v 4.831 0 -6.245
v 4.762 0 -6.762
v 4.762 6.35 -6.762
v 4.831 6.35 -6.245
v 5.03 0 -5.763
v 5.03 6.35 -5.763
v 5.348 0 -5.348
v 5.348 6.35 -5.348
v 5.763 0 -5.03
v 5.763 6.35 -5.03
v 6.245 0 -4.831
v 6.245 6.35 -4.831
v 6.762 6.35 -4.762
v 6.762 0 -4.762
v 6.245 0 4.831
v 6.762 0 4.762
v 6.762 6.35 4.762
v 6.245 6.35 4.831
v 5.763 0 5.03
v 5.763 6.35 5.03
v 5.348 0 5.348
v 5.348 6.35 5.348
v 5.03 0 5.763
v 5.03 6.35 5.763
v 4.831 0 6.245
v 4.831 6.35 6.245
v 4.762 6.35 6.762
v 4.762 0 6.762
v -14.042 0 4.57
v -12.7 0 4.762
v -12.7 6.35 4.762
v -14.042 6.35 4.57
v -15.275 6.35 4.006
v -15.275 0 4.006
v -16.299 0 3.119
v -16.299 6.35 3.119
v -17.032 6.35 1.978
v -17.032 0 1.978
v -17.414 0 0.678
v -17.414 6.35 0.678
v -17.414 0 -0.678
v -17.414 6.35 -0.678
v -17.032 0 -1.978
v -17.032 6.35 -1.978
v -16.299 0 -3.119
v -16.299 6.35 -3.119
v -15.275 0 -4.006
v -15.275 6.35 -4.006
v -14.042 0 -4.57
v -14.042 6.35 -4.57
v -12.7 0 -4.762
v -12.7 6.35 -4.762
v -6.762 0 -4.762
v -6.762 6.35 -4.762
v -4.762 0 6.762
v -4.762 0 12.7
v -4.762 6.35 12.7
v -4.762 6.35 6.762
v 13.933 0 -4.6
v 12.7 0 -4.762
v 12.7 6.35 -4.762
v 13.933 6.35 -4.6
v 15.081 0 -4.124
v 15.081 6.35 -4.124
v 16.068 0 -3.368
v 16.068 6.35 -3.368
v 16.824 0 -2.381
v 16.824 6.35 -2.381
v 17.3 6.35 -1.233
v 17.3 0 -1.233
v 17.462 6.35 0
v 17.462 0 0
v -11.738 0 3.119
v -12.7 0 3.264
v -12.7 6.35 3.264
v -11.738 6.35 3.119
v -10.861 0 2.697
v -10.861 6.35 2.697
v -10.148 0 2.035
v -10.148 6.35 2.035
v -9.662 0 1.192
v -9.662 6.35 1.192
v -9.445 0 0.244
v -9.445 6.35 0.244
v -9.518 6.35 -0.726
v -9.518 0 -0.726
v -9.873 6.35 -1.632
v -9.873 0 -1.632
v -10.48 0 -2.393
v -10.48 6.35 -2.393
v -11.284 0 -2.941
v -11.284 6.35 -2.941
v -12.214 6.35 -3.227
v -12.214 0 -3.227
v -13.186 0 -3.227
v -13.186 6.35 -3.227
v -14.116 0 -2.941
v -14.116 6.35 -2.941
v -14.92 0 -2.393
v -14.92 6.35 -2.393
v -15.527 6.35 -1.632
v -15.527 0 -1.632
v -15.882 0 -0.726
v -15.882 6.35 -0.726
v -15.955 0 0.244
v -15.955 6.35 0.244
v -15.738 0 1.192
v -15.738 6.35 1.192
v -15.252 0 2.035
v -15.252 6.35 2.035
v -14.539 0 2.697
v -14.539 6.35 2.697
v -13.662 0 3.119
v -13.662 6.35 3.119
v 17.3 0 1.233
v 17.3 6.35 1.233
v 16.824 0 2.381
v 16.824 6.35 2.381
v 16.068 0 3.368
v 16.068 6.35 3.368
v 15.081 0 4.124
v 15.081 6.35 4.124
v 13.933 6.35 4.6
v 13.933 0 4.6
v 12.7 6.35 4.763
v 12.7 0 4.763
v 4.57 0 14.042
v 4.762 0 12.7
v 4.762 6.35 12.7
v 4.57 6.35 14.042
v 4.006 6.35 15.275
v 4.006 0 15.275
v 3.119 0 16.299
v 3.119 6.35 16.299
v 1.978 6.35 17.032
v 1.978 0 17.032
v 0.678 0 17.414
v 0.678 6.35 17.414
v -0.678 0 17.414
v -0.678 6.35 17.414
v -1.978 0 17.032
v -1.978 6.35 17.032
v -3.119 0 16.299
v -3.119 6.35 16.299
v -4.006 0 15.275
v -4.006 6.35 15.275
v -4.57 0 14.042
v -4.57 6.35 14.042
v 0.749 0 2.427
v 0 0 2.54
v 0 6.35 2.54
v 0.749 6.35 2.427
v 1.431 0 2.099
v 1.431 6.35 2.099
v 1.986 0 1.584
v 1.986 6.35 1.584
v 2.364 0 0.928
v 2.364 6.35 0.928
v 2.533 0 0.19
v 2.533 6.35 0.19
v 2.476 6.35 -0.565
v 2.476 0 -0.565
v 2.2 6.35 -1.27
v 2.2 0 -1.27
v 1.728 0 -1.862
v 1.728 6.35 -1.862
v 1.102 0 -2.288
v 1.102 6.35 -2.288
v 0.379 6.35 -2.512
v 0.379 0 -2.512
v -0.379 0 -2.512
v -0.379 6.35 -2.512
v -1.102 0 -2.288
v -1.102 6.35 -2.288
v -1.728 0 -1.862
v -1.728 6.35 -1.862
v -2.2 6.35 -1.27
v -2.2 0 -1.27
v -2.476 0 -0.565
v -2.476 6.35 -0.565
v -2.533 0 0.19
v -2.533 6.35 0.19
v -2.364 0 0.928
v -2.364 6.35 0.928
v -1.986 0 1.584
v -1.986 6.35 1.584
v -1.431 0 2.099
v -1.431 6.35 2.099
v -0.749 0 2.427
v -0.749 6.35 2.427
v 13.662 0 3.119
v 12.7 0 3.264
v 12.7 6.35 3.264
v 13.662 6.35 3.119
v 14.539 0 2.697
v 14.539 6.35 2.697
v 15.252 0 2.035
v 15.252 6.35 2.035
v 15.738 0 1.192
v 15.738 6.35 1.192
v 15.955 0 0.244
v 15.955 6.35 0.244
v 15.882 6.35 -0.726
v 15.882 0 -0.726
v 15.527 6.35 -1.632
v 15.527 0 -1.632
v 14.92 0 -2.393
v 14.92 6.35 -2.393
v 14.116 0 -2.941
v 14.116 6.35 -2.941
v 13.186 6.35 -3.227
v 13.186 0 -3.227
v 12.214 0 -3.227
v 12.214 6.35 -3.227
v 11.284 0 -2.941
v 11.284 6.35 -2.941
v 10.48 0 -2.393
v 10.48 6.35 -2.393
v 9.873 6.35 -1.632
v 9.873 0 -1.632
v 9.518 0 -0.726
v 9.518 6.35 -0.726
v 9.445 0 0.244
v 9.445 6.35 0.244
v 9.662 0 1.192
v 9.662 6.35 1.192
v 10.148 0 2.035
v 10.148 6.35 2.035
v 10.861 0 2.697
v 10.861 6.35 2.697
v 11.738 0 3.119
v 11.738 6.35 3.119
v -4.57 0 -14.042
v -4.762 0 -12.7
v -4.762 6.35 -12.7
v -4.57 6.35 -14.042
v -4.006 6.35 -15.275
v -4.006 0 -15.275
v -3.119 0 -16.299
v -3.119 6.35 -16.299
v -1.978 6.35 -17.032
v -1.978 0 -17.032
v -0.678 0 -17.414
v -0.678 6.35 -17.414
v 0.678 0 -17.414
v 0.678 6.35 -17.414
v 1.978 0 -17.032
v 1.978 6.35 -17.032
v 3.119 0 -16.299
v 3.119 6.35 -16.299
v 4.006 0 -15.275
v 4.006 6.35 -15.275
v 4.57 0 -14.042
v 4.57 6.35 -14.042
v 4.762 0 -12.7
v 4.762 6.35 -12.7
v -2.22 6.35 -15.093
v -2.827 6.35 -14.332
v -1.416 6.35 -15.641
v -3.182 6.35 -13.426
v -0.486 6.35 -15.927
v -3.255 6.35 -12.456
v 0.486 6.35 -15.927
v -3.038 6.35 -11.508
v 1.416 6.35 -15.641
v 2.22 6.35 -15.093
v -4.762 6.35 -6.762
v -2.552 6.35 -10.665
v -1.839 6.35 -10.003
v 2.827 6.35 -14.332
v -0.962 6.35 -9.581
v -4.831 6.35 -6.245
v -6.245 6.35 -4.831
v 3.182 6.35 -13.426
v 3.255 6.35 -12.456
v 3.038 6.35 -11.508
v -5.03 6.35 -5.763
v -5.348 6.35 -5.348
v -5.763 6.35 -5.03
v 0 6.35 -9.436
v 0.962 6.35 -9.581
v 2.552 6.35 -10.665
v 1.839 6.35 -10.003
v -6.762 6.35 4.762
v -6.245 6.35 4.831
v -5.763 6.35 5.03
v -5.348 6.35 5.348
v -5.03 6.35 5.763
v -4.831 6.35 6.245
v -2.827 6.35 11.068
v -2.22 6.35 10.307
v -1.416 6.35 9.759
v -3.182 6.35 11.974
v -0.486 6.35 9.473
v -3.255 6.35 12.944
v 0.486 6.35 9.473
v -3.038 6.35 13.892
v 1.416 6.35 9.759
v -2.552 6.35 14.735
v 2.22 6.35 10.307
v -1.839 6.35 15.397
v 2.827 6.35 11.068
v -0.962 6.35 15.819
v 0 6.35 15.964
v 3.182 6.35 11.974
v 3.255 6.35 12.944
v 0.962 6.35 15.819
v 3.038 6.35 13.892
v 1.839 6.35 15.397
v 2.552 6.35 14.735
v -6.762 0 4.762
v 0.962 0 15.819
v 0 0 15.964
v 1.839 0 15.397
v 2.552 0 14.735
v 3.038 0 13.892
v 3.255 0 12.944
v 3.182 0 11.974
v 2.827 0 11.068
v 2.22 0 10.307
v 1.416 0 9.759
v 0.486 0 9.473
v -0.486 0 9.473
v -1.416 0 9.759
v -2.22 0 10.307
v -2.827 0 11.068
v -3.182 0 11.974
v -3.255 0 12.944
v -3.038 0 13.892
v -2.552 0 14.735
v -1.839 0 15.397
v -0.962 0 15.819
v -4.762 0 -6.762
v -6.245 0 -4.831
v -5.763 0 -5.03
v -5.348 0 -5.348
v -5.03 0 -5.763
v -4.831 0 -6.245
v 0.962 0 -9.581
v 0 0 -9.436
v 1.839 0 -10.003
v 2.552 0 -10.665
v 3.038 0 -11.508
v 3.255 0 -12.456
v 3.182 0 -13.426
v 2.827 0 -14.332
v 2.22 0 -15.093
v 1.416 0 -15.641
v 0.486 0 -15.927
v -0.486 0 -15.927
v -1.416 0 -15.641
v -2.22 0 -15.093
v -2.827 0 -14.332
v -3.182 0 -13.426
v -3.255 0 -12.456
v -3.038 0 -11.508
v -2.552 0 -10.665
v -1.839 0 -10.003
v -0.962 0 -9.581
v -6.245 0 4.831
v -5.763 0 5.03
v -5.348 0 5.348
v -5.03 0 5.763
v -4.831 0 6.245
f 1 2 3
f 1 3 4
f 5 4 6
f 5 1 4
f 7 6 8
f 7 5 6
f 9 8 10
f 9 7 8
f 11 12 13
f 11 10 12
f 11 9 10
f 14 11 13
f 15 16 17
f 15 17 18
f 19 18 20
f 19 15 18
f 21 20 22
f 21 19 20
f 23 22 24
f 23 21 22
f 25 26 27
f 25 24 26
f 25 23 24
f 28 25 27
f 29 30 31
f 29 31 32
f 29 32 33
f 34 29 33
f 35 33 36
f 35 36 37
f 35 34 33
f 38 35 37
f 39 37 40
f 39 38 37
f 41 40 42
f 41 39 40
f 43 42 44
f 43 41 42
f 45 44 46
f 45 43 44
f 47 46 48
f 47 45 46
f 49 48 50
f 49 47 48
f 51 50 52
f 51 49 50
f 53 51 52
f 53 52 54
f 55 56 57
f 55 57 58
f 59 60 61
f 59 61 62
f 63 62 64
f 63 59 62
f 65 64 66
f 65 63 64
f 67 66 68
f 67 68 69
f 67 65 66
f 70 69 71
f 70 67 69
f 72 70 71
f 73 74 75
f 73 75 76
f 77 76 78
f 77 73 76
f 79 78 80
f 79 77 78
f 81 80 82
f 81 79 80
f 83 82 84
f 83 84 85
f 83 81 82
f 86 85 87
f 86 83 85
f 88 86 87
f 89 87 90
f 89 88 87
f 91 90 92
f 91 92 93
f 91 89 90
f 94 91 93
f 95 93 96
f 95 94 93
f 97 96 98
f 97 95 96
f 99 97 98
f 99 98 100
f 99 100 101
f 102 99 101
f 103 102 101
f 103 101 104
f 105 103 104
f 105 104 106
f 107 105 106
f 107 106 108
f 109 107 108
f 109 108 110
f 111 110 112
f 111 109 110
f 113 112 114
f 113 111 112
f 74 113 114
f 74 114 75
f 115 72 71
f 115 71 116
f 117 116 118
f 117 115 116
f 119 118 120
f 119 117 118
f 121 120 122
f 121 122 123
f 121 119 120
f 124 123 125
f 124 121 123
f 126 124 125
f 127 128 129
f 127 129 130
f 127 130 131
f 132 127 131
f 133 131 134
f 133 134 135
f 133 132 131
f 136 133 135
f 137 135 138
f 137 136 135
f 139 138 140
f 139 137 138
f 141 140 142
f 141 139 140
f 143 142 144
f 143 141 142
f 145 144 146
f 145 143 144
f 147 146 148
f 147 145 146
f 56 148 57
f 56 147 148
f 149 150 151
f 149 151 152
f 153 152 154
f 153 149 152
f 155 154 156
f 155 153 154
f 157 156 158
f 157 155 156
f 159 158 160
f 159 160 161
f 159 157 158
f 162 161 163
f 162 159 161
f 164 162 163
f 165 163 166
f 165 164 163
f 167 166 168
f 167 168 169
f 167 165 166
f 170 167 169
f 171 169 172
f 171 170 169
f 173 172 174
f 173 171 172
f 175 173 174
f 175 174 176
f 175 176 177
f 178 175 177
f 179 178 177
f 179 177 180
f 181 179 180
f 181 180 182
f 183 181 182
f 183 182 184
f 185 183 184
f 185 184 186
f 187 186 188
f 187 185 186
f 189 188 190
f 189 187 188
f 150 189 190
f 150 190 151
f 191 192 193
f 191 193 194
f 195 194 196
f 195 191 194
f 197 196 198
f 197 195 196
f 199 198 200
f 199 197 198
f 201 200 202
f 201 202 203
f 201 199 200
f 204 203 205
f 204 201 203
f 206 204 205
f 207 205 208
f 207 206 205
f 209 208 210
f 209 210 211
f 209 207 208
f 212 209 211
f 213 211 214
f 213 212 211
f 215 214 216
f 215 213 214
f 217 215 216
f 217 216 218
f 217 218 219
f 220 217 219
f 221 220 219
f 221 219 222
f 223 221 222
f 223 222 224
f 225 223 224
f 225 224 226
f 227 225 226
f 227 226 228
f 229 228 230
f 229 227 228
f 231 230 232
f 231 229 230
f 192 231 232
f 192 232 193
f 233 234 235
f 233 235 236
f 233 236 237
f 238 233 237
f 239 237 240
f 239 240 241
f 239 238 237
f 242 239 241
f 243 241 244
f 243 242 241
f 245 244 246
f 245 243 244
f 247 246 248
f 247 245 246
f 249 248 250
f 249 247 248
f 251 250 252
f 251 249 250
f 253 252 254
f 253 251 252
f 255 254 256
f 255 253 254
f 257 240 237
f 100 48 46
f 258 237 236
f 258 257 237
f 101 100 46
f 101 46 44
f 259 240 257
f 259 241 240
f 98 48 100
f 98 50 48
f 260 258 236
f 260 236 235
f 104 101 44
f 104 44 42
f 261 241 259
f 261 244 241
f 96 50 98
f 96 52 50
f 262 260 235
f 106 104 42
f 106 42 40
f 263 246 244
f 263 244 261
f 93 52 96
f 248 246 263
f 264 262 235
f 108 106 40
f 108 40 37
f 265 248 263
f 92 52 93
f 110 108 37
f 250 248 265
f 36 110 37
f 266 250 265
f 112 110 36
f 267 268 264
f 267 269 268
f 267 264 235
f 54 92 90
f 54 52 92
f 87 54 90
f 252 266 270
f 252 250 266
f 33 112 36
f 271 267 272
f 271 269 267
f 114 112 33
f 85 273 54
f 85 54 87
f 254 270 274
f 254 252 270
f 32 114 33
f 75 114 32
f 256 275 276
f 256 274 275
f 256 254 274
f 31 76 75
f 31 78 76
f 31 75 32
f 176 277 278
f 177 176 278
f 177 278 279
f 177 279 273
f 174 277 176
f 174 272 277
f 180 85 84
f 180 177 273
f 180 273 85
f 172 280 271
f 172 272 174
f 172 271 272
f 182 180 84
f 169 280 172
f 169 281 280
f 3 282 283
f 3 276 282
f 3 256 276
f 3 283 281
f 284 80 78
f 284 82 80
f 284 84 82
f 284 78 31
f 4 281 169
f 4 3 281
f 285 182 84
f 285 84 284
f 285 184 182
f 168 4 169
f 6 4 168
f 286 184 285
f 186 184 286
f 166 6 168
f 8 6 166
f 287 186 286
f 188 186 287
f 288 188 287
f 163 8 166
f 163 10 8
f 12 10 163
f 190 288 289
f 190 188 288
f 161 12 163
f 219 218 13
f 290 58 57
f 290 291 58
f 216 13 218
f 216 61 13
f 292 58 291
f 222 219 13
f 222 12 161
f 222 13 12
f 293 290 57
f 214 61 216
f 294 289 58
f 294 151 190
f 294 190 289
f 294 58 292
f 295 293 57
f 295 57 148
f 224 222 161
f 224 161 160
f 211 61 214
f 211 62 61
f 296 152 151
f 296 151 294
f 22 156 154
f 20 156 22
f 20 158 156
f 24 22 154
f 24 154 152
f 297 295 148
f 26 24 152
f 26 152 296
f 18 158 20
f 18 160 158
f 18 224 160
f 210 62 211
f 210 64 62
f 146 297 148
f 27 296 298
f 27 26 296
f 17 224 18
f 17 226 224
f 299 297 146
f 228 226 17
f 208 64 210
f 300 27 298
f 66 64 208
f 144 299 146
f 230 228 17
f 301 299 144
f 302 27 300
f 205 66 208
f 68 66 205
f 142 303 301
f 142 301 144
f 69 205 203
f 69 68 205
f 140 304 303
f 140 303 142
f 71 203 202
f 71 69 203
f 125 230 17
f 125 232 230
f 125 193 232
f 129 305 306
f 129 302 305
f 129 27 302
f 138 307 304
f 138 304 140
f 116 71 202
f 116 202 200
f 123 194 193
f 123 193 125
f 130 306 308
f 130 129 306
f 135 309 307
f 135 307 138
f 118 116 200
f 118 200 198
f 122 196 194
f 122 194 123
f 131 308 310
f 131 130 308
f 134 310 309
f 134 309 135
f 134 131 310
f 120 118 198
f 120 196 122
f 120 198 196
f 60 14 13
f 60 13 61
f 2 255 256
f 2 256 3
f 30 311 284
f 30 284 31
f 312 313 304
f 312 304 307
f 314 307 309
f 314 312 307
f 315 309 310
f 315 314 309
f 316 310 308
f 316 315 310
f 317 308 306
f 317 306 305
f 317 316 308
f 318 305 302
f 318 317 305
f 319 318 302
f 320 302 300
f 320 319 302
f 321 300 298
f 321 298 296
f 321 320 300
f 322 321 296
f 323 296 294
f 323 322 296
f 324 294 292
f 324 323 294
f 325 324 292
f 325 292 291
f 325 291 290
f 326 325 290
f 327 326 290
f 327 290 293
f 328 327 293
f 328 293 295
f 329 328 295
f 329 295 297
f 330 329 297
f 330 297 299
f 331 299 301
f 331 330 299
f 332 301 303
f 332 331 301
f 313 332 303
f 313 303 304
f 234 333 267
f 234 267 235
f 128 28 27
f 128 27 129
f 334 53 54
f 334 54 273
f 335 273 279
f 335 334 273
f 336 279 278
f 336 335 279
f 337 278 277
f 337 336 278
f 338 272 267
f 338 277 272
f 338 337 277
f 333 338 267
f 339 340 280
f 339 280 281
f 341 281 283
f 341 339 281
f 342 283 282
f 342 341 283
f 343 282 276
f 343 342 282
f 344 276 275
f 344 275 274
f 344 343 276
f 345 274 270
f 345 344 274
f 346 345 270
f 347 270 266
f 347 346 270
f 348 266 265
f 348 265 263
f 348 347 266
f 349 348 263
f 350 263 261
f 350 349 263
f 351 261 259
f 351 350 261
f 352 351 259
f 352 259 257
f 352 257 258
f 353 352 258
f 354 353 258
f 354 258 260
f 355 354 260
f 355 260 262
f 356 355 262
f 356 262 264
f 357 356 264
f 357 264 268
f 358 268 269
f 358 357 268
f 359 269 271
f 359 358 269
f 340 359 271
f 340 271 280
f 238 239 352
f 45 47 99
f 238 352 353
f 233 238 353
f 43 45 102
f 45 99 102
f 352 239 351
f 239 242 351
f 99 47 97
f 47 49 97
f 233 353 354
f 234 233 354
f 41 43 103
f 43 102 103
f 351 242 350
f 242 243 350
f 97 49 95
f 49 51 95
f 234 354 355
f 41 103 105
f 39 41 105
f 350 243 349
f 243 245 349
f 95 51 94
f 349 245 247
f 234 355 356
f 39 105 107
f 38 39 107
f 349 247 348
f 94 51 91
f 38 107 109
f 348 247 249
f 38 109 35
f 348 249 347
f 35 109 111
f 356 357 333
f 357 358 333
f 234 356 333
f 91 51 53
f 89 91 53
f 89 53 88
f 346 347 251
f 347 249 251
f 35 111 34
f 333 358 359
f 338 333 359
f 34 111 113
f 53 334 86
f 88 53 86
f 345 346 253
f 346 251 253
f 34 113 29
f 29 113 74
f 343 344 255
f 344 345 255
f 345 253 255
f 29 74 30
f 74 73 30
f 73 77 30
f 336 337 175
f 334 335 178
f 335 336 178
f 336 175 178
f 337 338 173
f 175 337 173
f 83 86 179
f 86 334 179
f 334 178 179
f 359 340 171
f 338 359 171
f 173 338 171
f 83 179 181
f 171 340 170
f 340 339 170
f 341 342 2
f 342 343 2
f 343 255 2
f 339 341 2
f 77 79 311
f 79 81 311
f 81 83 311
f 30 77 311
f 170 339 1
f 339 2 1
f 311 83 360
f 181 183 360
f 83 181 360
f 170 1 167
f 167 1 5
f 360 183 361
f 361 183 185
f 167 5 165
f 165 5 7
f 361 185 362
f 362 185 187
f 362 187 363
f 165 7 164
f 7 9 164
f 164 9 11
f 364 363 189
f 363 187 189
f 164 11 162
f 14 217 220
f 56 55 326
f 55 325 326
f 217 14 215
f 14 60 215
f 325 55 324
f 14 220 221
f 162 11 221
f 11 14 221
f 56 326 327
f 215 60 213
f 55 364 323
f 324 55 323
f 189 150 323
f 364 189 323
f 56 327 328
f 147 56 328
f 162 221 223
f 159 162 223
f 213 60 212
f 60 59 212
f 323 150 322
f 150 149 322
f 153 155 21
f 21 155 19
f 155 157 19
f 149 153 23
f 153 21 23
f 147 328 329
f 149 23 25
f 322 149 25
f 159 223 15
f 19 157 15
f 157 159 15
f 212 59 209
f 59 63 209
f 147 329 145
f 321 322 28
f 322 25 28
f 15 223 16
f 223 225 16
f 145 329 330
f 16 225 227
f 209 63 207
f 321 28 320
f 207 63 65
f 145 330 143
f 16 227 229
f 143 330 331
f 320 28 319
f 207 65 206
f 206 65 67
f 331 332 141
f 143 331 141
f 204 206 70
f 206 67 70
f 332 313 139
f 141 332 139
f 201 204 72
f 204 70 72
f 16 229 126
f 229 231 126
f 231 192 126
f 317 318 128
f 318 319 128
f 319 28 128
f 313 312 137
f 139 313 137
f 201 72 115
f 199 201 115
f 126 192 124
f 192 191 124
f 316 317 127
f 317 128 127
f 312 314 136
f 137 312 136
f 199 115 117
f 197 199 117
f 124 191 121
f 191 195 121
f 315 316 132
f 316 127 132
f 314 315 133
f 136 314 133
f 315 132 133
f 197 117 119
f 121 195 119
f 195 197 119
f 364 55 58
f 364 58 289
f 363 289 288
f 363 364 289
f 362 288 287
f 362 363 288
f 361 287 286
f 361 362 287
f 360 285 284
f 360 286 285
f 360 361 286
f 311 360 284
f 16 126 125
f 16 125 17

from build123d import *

# Parameters (mm, degrees)
SKETCH1_R           = 25.4
SKETCH1_R_2         = 2.54
SKETCH1_R_3         = 3.2639
BOSS_EXTRUDE1_DEPTH = 6.35
SKETCH2_R           = 25.4
CUT_EXTRUDE1_DEPTH  = 10


with BuildPart() as part:
    # Sketch1 → Boss-Extrude1 (new body)
    with BuildSketch(Plane(origin=(0, 0, 0), x_dir=(1, 0, 0), z_dir=(0, 1, 0))):
        with Locations(Location((0, 0, 0), (0, 0, 270))):
            Circle(SKETCH1_R)
        with Locations(Location((0, 0, 0), (0, 0, 270))):
            Circle(SKETCH1_R_2, mode=Mode.SUBTRACT)
        with Locations(Location((0, 12.7, 0), (0, 0, 270))):
            Circle(SKETCH1_R_3, mode=Mode.SUBTRACT)
        with Locations(Location((12.7, 0, 0), (0, 0, 270))):
            Circle(SKETCH1_R_3, mode=Mode.SUBTRACT)
        with Locations(Location((0, -12.7, 0), (0, 0, 270))):
            Circle(SKETCH1_R_3, mode=Mode.SUBTRACT)
        with Locations(Location((-12.7, 0, 0), (0, 0, 270))):
            Circle(SKETCH1_R_3, mode=Mode.SUBTRACT)
    extrude(amount=BOSS_EXTRUDE1_DEPTH)

    # Sketch2 → Cut-Extrude1 (cut)
    with BuildSketch(Plane(origin=(0, 0, 0), x_dir=(1, 0, 0), z_dir=(0, 1, 0))):
        Circle(SKETCH2_R)
        with BuildLine():
            ThreePointArc((-4.7625, 12.7), (0, 17.4625), (4.7625, 12.7))
            Line((4.7625, 12.7), (4.7625, 6.7625))
            ThreePointArc((4.7625, 6.7625), (5.348286438, 5.348286438), (6.7625, 4.7625))
            Line((6.7625, 4.7625), (12.7, 4.7625))
            ThreePointArc((12.7, 4.7625), (16.067596045, 3.367596045), (17.4625, 0))
            ThreePointArc((17.4625, 0), (16.067596045, -3.367596045), (12.7, -4.7625))
            Line((12.7, -4.7625), (6.7625, -4.7625))
            ThreePointArc((6.7625, -4.7625), (5.348286438, -5.348286438), (4.7625, -6.7625))
            Line((4.7625, -6.7625), (4.7625, -12.7))
            ThreePointArc((4.7625, -12.7), (0, -17.4625), (-4.7625, -12.7))
            Line((-4.7625, -12.7), (-4.7625, -6.7625))
            ThreePointArc((-4.7625, -6.7625), (-5.348286438, -5.348286438), (-6.7625, -4.7625))
            Line((-6.7625, -4.7625), (-12.7, -4.7625))
            ThreePointArc((-12.7, -4.7625), (-17.4625, 0), (-12.7, 4.7625))
            Line((-12.7, 4.7625), (-6.7625, 4.7625))
            ThreePointArc((-6.7625, 4.7625), (-5.348286438, 5.348286438), (-4.7625, 6.7625))
            Line((-4.7625, 6.7625), (-4.7625, 12.7))
        make_face(mode=Mode.SUBTRACT)
    extrude(amount=CUT_EXTRUDE1_DEPTH, mode=Mode.SUBTRACT)


solid = part.part
